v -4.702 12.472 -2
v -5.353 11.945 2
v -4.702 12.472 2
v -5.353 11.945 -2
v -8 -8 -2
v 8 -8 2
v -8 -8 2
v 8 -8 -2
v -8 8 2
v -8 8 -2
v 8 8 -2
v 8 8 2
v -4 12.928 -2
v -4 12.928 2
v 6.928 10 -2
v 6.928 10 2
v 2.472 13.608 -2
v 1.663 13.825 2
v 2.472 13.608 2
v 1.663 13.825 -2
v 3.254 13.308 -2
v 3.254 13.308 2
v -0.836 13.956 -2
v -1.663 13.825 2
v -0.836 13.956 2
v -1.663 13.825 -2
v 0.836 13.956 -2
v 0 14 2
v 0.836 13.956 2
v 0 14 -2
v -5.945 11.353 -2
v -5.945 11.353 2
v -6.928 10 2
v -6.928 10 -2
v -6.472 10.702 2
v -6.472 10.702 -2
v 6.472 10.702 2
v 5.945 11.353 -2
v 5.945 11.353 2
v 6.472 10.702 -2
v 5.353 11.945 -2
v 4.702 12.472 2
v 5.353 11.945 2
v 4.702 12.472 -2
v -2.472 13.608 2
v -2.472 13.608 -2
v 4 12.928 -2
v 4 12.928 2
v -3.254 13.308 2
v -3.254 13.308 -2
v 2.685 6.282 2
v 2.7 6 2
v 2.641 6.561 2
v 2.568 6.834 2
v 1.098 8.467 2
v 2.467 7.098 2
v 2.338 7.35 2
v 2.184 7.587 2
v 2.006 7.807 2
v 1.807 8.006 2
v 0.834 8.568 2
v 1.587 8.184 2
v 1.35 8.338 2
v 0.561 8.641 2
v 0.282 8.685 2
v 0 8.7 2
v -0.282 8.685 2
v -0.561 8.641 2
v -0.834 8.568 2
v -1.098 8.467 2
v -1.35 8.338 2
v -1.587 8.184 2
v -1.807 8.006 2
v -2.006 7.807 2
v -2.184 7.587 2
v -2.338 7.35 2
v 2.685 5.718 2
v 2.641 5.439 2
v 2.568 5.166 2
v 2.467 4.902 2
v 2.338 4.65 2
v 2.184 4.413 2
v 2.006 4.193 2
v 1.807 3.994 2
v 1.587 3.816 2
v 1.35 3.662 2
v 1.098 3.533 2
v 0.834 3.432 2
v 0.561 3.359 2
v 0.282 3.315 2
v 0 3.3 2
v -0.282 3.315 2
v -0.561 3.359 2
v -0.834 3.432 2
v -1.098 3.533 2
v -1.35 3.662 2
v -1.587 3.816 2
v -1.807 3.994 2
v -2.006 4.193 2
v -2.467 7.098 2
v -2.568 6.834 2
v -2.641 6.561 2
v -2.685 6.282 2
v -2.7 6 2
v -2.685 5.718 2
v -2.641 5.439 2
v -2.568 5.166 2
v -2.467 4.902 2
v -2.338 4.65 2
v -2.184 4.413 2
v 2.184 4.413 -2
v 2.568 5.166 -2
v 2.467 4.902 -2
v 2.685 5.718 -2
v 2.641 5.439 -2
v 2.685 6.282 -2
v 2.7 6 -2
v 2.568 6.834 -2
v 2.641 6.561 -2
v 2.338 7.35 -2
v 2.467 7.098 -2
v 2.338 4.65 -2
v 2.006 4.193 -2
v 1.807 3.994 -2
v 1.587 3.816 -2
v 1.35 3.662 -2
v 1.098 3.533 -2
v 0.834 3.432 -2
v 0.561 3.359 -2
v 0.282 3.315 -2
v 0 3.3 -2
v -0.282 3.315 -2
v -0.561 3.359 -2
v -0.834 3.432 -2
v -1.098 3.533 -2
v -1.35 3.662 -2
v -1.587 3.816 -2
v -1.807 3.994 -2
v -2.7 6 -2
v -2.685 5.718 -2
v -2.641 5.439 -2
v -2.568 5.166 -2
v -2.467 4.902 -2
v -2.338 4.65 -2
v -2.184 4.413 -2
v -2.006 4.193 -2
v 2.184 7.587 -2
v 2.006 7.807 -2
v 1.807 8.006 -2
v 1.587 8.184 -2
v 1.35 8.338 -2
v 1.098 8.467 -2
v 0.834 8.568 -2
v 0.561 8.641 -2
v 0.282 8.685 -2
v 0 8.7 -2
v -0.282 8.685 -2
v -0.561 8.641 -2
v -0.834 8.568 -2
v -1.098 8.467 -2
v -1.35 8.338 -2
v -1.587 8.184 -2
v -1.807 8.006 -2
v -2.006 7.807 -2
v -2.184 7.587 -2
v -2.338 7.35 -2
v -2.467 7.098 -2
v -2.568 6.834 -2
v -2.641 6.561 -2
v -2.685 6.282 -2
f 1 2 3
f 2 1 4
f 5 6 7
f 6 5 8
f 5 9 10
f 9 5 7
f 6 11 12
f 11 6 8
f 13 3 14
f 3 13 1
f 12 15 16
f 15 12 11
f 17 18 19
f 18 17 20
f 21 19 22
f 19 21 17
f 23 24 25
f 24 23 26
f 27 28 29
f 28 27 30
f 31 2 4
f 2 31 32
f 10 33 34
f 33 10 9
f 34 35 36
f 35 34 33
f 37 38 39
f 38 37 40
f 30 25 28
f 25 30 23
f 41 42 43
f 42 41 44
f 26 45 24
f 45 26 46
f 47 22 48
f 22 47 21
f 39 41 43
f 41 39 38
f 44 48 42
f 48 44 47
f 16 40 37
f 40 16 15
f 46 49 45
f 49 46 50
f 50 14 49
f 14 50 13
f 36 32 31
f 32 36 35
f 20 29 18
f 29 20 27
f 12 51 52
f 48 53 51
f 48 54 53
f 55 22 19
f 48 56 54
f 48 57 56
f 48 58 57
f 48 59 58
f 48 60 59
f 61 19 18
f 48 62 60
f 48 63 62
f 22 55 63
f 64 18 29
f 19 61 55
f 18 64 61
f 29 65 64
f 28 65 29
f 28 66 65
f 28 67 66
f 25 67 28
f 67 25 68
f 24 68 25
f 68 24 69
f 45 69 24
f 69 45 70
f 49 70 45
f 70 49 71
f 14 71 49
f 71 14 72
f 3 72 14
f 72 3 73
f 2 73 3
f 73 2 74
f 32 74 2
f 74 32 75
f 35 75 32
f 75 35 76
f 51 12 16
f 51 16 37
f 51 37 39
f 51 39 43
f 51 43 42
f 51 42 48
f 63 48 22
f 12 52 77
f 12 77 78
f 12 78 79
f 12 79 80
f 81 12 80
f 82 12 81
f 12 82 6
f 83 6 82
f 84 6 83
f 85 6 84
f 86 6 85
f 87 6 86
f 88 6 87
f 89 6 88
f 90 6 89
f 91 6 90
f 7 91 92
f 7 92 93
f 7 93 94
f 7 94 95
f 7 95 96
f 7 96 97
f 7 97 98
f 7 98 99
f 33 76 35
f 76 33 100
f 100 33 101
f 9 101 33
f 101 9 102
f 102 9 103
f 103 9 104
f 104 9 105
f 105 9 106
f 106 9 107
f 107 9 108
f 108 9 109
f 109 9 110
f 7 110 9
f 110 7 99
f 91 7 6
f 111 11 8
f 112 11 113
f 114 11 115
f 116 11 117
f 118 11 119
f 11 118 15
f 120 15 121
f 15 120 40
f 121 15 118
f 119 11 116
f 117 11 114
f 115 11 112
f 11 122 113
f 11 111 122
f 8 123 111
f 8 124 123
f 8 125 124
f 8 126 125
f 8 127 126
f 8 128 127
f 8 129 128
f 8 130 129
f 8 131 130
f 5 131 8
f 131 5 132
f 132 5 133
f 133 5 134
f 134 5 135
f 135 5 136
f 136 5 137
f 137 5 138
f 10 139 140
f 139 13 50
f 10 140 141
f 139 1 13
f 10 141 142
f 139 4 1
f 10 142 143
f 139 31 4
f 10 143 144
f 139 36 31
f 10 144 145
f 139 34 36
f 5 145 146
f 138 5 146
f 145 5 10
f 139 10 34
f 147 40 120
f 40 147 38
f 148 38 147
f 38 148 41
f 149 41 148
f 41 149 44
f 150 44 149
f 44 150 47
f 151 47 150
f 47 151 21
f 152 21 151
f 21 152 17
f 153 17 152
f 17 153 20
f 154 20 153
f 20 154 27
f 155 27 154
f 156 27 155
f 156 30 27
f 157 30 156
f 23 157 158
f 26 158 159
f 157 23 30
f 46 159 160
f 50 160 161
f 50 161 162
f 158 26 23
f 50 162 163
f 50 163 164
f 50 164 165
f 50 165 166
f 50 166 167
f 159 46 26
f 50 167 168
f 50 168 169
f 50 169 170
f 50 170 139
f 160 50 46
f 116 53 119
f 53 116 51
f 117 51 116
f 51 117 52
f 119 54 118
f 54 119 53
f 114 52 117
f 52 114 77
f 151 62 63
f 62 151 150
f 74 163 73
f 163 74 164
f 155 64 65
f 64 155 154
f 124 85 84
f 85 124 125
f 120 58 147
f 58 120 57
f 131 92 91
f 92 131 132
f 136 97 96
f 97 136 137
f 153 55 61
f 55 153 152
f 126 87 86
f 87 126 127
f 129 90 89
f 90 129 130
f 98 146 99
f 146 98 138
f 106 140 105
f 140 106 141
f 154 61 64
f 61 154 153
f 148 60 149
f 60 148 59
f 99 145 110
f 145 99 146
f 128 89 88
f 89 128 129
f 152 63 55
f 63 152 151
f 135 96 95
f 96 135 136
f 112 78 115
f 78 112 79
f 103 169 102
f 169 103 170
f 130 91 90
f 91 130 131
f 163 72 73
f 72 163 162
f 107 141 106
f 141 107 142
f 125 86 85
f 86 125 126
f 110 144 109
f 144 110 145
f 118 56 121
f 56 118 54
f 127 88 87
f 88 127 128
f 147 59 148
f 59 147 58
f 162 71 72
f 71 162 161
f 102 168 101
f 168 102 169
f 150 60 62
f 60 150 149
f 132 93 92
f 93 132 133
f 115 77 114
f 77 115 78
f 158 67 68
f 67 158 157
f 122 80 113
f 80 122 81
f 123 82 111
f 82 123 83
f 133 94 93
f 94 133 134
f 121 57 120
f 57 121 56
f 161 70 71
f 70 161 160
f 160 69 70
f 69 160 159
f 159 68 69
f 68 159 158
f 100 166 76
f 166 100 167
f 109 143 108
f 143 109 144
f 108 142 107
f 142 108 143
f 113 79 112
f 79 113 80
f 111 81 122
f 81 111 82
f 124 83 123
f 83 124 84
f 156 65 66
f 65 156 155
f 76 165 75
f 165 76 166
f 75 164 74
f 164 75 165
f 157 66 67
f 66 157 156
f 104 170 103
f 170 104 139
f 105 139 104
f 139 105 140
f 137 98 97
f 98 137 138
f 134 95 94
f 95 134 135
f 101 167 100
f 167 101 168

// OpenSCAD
// Single-hole mounting tab.
$fn = 60;
eps = 0.02;
tab_w = 16;
tab_h = 28;
tab_t = 4;
hole_d = 5.4;
difference() {
    hull() {
        translate([0, 0, 0]) cube([tab_w, tab_w, tab_t], center = true);
        translate([0, tab_h / 2 - tab_w / 2, 0]) cylinder(d = tab_w, h = tab_t, center = true);
    }
    translate([0, tab_h / 2 - tab_w / 2, -tab_t / 2 - eps]) cylinder(d = hole_d, h = tab_t + 2 * eps);
}
